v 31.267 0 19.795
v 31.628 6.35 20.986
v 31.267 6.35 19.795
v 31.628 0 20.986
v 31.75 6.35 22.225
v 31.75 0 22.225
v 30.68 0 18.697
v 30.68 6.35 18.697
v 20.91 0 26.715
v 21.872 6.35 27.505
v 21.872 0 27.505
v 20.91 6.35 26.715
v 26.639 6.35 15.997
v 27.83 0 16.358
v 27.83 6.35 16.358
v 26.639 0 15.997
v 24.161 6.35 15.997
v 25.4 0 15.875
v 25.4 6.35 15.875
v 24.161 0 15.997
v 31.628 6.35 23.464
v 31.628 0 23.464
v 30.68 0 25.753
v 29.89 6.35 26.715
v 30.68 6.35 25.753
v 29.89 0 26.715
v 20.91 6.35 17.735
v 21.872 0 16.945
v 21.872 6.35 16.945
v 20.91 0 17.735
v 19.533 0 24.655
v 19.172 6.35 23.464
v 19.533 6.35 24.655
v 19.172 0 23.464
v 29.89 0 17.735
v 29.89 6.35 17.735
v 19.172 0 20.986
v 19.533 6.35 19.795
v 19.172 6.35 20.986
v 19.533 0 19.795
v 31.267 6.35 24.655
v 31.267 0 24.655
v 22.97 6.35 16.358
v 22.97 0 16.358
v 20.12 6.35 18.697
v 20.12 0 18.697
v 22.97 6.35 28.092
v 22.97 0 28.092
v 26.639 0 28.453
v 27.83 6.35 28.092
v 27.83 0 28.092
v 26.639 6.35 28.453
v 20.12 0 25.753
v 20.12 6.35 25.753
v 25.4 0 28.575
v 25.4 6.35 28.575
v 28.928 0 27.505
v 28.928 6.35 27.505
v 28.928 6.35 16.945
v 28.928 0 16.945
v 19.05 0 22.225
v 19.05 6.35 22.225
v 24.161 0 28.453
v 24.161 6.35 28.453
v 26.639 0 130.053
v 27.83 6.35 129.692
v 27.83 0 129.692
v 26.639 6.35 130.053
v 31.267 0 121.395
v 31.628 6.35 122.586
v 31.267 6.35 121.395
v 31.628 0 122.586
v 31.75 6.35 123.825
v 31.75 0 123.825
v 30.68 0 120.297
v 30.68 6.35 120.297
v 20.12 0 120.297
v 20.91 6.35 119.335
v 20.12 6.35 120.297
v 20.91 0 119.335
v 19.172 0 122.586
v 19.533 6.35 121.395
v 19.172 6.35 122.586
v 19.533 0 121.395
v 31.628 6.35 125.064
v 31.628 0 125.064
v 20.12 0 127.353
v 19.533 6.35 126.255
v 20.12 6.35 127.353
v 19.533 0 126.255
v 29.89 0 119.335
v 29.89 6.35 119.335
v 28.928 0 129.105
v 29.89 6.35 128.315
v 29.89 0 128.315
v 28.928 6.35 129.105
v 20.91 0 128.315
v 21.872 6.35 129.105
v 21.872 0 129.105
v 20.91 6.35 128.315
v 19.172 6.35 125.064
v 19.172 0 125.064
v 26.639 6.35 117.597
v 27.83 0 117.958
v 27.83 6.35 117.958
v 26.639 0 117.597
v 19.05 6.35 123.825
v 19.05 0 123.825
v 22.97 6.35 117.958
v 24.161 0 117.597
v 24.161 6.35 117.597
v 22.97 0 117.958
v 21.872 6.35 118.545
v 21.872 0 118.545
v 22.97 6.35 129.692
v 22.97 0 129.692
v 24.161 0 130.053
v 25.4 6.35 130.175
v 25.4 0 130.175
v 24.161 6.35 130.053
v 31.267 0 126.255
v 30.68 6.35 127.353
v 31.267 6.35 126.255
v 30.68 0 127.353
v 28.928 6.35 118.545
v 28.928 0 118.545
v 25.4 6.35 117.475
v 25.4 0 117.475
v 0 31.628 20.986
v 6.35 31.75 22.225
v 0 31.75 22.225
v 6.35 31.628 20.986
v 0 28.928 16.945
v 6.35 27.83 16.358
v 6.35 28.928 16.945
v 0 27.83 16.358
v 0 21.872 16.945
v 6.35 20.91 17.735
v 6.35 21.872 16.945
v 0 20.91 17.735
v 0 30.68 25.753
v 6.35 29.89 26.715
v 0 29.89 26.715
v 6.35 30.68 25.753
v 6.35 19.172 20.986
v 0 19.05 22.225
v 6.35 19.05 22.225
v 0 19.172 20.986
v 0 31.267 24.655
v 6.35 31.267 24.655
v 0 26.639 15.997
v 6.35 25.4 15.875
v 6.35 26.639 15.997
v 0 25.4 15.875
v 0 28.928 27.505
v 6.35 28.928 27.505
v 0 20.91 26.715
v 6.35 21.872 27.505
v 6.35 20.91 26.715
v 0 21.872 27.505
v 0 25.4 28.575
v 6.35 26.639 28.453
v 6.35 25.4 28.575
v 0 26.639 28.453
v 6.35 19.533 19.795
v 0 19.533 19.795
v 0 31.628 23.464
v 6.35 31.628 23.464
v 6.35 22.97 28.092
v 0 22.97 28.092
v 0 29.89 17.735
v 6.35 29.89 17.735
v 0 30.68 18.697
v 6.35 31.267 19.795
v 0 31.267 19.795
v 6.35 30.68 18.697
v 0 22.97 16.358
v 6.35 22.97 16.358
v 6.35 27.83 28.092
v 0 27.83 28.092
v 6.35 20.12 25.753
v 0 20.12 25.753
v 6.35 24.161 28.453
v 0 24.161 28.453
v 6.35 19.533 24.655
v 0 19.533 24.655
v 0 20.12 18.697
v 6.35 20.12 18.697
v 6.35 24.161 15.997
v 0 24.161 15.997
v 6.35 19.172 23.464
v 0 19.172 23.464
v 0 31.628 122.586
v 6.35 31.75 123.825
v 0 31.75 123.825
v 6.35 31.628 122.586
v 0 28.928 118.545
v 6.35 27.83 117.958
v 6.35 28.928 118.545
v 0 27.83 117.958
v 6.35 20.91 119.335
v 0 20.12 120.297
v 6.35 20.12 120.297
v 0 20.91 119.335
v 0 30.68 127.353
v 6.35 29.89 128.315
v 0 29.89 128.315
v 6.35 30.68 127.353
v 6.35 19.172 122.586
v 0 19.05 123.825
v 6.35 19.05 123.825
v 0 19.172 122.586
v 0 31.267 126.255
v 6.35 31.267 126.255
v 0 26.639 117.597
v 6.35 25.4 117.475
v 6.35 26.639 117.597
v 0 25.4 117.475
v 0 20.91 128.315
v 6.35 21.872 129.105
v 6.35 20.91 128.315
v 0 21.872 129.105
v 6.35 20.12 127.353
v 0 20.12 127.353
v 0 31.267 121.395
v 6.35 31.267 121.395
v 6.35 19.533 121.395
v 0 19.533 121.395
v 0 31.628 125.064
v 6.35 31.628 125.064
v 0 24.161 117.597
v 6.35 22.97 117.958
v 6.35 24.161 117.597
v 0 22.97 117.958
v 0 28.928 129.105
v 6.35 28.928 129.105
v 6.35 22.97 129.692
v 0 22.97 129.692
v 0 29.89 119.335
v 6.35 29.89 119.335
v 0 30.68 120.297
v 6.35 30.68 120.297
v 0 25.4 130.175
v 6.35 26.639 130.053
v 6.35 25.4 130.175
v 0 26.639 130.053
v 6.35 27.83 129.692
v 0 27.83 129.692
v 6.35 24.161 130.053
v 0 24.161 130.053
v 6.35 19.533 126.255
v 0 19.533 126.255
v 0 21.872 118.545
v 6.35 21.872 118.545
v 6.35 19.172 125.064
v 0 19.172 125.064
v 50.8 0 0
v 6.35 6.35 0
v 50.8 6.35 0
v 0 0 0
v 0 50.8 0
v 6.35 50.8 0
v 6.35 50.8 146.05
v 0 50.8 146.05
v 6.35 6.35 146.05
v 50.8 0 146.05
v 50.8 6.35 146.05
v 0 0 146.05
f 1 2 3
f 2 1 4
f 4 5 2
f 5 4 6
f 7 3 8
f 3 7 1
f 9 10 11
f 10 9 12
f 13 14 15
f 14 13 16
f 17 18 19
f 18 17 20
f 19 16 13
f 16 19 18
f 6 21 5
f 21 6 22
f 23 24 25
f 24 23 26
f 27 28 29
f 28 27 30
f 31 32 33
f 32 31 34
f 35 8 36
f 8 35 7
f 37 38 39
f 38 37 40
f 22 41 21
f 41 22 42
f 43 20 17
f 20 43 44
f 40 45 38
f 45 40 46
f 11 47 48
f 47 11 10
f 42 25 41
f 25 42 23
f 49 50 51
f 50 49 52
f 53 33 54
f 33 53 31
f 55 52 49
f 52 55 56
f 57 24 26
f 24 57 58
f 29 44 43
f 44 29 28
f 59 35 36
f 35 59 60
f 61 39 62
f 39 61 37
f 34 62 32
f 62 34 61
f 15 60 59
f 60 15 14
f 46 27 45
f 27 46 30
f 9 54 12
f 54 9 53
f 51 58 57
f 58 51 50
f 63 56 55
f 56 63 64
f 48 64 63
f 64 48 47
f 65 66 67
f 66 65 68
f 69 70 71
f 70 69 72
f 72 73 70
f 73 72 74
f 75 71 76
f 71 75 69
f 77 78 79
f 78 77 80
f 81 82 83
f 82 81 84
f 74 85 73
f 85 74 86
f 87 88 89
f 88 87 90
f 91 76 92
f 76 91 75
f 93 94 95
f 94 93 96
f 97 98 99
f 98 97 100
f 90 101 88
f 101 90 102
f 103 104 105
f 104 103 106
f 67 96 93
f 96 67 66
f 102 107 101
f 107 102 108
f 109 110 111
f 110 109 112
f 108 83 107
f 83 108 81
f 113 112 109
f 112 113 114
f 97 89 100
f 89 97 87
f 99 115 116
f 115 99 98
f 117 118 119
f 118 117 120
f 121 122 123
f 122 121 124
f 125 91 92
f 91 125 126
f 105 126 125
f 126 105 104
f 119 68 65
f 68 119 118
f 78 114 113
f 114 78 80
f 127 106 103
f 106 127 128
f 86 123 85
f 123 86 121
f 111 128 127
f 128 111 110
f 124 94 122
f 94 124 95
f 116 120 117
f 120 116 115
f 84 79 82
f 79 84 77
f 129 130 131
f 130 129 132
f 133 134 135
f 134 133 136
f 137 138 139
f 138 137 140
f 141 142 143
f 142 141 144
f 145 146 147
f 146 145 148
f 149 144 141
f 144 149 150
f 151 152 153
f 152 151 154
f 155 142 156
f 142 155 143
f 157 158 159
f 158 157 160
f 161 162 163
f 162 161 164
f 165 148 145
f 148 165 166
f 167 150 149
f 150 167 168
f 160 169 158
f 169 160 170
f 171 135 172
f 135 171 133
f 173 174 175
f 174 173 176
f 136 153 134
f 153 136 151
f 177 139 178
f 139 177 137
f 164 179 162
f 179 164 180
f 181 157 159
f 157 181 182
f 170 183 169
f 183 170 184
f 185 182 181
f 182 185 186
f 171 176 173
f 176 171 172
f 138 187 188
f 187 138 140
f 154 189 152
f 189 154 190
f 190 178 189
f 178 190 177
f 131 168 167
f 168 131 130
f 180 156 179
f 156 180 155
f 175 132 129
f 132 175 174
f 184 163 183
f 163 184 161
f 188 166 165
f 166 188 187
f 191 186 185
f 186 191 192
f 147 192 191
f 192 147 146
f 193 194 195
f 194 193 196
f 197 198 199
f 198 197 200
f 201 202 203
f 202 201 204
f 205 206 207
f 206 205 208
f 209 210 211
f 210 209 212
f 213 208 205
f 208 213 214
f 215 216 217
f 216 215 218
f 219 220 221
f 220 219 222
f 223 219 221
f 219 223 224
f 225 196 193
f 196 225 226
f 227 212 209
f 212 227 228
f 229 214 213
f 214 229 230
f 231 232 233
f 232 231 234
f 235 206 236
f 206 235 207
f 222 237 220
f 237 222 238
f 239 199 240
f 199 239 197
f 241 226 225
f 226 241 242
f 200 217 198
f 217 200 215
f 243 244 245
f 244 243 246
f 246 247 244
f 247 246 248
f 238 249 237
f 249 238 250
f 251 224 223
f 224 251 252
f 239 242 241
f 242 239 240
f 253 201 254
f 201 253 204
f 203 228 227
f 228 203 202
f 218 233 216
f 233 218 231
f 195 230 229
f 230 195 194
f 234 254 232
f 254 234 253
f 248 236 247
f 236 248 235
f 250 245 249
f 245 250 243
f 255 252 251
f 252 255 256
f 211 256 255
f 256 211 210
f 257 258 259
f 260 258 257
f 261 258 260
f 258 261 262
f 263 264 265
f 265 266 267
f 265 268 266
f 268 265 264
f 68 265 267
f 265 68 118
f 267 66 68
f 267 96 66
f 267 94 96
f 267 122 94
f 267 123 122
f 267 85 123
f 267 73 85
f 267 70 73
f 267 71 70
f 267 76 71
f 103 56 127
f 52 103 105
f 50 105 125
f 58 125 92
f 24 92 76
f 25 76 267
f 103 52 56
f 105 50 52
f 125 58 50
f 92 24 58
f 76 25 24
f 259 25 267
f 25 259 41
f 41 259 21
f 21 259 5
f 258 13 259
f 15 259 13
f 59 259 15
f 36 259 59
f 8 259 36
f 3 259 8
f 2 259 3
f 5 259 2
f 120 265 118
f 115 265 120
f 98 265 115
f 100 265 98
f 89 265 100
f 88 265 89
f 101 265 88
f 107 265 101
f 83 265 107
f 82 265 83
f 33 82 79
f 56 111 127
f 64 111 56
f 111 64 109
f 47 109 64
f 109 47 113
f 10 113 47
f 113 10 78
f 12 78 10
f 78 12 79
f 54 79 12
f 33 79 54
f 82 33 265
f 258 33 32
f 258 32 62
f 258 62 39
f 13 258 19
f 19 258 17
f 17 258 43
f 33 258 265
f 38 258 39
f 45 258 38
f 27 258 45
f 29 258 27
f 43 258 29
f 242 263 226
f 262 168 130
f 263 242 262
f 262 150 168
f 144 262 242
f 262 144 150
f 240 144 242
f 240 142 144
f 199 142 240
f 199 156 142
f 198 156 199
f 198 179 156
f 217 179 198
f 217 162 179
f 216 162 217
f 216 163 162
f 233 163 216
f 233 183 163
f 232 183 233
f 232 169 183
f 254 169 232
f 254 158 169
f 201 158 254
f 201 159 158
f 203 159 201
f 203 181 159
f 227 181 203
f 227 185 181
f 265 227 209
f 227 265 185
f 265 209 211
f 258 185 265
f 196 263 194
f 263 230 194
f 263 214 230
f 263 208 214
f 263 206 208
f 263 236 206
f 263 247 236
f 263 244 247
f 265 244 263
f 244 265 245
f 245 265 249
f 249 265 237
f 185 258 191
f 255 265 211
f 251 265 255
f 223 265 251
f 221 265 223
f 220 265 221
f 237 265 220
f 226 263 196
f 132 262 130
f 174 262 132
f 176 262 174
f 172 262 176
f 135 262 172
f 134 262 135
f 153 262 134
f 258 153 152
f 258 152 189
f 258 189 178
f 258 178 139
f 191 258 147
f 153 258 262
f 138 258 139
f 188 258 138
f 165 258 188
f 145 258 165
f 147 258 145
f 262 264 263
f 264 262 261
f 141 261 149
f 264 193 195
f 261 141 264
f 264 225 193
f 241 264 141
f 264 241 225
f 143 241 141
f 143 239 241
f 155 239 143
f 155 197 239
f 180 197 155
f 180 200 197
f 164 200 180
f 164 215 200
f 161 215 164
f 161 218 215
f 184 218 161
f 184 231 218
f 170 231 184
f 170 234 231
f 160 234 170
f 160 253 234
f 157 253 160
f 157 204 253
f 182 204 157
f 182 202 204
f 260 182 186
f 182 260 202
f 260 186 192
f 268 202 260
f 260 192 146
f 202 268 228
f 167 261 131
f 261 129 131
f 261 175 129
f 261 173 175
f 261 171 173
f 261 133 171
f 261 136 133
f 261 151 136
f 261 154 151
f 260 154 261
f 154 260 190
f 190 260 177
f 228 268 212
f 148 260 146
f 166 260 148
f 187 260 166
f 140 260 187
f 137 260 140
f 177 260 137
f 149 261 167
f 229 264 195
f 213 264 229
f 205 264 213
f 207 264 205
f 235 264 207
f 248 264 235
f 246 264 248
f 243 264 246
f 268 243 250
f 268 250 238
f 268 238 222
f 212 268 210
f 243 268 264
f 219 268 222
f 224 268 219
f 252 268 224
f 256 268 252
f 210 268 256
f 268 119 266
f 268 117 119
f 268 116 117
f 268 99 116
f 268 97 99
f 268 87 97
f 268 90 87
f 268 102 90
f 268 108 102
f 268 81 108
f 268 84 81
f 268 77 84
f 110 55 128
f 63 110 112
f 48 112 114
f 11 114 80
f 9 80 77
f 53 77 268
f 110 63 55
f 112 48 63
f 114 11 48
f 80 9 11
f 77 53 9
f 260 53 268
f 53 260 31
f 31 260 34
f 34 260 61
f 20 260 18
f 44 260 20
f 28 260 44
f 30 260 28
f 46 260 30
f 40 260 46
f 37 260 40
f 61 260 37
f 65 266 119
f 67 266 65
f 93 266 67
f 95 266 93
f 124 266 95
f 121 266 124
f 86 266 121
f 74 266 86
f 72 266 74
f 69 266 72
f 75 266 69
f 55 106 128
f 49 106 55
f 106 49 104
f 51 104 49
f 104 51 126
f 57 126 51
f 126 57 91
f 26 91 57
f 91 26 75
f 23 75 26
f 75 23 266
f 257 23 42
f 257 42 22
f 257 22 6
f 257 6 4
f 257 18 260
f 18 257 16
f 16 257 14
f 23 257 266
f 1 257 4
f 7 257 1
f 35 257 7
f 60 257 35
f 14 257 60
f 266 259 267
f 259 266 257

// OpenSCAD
// Part A9: Front Stiffener Center Section Angle Iron
// Material: 2"×2"×1/4" Angle Iron (50.8mm leg × 6.35mm thickness)
// Quantity: 2 pieces (left motor plate, right motor plate)
// Location: Front stiffener plate, 10" center section between motor plates
//
// These are the same height as frame tube angles (5.75" / 146.05mm)
// Used to connect the 10" tall center section to the motor mount plates
// Bolt pattern: 1/2" bolts, 4" spacing (same as frame tube angles)

include <../../lifetrac_v25_params.scad>

// =============================================================================
// PART DIMENSIONS
// =============================================================================

_leg = 50.8;    // 2" angle leg
_thick = 6.35;  // 1/4" thickness
_trim = 3.175;  // 1/8" trimmed from each end

// Height matches frame tube angle: 6" tube - 2×(1/8" trim) = 5.75"
_frame_tube_height = is_undef(FRAME_TUBE_HEIGHT) ? 152.4 : FRAME_TUBE_HEIGHT;

PART_A9_HEIGHT = _frame_tube_height - 2*_trim;  // 146.05mm (5.75")
PART_A9_LEG = _leg;
PART_A9_THICK = _thick;

// Bolt parameters (match frame tube angle pattern)
_bolt_dia = is_undef(BOLT_DIA_1_2) ? 12.7 : BOLT_DIA_1_2;  // 1/2" bolts
_plate_bolt_offset = 50.8;  // 2" from center (4" total spacing)
_hole_offset = _leg / 2;    // Center of angle leg

// =============================================================================
// MAIN MODULE
// =============================================================================

/**
 * Part A9: Front Stiffener Center Section Angle Iron
 * Vertical angle iron for 10" center section of front stiffener
 * Same dimensions as frame tube mounting angles
 * show_holes: if true, renders bolt holes
 */
module _part_a9_front_center_angle(show_holes=true) {
    height = PART_A9_HEIGHT;
    leg = PART_A9_LEG;
    thick = PART_A9_THICK;
    
    color("Silver")
    difference() {
        // L-profile
        linear_extrude(height=height)
        polygon([
            [0, 0],
            [leg, 0],
            [leg, thick],
            [thick, thick],
            [thick, leg],
            [0, leg]
        ]);
        
        if (show_holes) {
            // Vertical leg holes (through thickness, bolt to plate)
            // 2 holes at 4" spacing centered on height
            _center_z = height / 2;
            for (z_off = [-_plate_bolt_offset, _plate_bolt_offset]) {
                translate([_hole_offset, -1, _center_z + z_off])
                rotate([-90, 0, 0])
                cylinder(d=_bolt_dia, h=thick + 2, $fn=32);
            }
            
            // Horizontal leg holes (through thickness, bolt to stiffener plate)
            for (z_off = [-_plate_bolt_offset, _plate_bolt_offset]) {
                translate([-1, _hole_offset, _center_z + z_off])
                rotate([0, 90, 0])
                cylinder(d=_bolt_dia, h=thick + 2, $fn=32);
            }
        }
    }
}

// =============================================================================
// RENDER
// =============================================================================

_part_a9_front_center_angle(show_holes=true);

echo("=== PART A9: Front Stiffener Center Section Angle Iron ===");
echo("Height:", PART_A9_HEIGHT, "mm (", PART_A9_HEIGHT/25.4, "in)");
echo("Leg:", PART_A9_LEG, "mm (2 inches)");
echo("Thickness:", PART_A9_THICK, "mm (1/4 inch)");
echo("Bolt pattern: 2 holes per leg, 4\" spacing, 1/2\" dia");
echo("Quantity needed: 2 pieces (left and right motor plate faces)");
echo("Note: Identical dimensions to frame tube mount angles (A4)");
